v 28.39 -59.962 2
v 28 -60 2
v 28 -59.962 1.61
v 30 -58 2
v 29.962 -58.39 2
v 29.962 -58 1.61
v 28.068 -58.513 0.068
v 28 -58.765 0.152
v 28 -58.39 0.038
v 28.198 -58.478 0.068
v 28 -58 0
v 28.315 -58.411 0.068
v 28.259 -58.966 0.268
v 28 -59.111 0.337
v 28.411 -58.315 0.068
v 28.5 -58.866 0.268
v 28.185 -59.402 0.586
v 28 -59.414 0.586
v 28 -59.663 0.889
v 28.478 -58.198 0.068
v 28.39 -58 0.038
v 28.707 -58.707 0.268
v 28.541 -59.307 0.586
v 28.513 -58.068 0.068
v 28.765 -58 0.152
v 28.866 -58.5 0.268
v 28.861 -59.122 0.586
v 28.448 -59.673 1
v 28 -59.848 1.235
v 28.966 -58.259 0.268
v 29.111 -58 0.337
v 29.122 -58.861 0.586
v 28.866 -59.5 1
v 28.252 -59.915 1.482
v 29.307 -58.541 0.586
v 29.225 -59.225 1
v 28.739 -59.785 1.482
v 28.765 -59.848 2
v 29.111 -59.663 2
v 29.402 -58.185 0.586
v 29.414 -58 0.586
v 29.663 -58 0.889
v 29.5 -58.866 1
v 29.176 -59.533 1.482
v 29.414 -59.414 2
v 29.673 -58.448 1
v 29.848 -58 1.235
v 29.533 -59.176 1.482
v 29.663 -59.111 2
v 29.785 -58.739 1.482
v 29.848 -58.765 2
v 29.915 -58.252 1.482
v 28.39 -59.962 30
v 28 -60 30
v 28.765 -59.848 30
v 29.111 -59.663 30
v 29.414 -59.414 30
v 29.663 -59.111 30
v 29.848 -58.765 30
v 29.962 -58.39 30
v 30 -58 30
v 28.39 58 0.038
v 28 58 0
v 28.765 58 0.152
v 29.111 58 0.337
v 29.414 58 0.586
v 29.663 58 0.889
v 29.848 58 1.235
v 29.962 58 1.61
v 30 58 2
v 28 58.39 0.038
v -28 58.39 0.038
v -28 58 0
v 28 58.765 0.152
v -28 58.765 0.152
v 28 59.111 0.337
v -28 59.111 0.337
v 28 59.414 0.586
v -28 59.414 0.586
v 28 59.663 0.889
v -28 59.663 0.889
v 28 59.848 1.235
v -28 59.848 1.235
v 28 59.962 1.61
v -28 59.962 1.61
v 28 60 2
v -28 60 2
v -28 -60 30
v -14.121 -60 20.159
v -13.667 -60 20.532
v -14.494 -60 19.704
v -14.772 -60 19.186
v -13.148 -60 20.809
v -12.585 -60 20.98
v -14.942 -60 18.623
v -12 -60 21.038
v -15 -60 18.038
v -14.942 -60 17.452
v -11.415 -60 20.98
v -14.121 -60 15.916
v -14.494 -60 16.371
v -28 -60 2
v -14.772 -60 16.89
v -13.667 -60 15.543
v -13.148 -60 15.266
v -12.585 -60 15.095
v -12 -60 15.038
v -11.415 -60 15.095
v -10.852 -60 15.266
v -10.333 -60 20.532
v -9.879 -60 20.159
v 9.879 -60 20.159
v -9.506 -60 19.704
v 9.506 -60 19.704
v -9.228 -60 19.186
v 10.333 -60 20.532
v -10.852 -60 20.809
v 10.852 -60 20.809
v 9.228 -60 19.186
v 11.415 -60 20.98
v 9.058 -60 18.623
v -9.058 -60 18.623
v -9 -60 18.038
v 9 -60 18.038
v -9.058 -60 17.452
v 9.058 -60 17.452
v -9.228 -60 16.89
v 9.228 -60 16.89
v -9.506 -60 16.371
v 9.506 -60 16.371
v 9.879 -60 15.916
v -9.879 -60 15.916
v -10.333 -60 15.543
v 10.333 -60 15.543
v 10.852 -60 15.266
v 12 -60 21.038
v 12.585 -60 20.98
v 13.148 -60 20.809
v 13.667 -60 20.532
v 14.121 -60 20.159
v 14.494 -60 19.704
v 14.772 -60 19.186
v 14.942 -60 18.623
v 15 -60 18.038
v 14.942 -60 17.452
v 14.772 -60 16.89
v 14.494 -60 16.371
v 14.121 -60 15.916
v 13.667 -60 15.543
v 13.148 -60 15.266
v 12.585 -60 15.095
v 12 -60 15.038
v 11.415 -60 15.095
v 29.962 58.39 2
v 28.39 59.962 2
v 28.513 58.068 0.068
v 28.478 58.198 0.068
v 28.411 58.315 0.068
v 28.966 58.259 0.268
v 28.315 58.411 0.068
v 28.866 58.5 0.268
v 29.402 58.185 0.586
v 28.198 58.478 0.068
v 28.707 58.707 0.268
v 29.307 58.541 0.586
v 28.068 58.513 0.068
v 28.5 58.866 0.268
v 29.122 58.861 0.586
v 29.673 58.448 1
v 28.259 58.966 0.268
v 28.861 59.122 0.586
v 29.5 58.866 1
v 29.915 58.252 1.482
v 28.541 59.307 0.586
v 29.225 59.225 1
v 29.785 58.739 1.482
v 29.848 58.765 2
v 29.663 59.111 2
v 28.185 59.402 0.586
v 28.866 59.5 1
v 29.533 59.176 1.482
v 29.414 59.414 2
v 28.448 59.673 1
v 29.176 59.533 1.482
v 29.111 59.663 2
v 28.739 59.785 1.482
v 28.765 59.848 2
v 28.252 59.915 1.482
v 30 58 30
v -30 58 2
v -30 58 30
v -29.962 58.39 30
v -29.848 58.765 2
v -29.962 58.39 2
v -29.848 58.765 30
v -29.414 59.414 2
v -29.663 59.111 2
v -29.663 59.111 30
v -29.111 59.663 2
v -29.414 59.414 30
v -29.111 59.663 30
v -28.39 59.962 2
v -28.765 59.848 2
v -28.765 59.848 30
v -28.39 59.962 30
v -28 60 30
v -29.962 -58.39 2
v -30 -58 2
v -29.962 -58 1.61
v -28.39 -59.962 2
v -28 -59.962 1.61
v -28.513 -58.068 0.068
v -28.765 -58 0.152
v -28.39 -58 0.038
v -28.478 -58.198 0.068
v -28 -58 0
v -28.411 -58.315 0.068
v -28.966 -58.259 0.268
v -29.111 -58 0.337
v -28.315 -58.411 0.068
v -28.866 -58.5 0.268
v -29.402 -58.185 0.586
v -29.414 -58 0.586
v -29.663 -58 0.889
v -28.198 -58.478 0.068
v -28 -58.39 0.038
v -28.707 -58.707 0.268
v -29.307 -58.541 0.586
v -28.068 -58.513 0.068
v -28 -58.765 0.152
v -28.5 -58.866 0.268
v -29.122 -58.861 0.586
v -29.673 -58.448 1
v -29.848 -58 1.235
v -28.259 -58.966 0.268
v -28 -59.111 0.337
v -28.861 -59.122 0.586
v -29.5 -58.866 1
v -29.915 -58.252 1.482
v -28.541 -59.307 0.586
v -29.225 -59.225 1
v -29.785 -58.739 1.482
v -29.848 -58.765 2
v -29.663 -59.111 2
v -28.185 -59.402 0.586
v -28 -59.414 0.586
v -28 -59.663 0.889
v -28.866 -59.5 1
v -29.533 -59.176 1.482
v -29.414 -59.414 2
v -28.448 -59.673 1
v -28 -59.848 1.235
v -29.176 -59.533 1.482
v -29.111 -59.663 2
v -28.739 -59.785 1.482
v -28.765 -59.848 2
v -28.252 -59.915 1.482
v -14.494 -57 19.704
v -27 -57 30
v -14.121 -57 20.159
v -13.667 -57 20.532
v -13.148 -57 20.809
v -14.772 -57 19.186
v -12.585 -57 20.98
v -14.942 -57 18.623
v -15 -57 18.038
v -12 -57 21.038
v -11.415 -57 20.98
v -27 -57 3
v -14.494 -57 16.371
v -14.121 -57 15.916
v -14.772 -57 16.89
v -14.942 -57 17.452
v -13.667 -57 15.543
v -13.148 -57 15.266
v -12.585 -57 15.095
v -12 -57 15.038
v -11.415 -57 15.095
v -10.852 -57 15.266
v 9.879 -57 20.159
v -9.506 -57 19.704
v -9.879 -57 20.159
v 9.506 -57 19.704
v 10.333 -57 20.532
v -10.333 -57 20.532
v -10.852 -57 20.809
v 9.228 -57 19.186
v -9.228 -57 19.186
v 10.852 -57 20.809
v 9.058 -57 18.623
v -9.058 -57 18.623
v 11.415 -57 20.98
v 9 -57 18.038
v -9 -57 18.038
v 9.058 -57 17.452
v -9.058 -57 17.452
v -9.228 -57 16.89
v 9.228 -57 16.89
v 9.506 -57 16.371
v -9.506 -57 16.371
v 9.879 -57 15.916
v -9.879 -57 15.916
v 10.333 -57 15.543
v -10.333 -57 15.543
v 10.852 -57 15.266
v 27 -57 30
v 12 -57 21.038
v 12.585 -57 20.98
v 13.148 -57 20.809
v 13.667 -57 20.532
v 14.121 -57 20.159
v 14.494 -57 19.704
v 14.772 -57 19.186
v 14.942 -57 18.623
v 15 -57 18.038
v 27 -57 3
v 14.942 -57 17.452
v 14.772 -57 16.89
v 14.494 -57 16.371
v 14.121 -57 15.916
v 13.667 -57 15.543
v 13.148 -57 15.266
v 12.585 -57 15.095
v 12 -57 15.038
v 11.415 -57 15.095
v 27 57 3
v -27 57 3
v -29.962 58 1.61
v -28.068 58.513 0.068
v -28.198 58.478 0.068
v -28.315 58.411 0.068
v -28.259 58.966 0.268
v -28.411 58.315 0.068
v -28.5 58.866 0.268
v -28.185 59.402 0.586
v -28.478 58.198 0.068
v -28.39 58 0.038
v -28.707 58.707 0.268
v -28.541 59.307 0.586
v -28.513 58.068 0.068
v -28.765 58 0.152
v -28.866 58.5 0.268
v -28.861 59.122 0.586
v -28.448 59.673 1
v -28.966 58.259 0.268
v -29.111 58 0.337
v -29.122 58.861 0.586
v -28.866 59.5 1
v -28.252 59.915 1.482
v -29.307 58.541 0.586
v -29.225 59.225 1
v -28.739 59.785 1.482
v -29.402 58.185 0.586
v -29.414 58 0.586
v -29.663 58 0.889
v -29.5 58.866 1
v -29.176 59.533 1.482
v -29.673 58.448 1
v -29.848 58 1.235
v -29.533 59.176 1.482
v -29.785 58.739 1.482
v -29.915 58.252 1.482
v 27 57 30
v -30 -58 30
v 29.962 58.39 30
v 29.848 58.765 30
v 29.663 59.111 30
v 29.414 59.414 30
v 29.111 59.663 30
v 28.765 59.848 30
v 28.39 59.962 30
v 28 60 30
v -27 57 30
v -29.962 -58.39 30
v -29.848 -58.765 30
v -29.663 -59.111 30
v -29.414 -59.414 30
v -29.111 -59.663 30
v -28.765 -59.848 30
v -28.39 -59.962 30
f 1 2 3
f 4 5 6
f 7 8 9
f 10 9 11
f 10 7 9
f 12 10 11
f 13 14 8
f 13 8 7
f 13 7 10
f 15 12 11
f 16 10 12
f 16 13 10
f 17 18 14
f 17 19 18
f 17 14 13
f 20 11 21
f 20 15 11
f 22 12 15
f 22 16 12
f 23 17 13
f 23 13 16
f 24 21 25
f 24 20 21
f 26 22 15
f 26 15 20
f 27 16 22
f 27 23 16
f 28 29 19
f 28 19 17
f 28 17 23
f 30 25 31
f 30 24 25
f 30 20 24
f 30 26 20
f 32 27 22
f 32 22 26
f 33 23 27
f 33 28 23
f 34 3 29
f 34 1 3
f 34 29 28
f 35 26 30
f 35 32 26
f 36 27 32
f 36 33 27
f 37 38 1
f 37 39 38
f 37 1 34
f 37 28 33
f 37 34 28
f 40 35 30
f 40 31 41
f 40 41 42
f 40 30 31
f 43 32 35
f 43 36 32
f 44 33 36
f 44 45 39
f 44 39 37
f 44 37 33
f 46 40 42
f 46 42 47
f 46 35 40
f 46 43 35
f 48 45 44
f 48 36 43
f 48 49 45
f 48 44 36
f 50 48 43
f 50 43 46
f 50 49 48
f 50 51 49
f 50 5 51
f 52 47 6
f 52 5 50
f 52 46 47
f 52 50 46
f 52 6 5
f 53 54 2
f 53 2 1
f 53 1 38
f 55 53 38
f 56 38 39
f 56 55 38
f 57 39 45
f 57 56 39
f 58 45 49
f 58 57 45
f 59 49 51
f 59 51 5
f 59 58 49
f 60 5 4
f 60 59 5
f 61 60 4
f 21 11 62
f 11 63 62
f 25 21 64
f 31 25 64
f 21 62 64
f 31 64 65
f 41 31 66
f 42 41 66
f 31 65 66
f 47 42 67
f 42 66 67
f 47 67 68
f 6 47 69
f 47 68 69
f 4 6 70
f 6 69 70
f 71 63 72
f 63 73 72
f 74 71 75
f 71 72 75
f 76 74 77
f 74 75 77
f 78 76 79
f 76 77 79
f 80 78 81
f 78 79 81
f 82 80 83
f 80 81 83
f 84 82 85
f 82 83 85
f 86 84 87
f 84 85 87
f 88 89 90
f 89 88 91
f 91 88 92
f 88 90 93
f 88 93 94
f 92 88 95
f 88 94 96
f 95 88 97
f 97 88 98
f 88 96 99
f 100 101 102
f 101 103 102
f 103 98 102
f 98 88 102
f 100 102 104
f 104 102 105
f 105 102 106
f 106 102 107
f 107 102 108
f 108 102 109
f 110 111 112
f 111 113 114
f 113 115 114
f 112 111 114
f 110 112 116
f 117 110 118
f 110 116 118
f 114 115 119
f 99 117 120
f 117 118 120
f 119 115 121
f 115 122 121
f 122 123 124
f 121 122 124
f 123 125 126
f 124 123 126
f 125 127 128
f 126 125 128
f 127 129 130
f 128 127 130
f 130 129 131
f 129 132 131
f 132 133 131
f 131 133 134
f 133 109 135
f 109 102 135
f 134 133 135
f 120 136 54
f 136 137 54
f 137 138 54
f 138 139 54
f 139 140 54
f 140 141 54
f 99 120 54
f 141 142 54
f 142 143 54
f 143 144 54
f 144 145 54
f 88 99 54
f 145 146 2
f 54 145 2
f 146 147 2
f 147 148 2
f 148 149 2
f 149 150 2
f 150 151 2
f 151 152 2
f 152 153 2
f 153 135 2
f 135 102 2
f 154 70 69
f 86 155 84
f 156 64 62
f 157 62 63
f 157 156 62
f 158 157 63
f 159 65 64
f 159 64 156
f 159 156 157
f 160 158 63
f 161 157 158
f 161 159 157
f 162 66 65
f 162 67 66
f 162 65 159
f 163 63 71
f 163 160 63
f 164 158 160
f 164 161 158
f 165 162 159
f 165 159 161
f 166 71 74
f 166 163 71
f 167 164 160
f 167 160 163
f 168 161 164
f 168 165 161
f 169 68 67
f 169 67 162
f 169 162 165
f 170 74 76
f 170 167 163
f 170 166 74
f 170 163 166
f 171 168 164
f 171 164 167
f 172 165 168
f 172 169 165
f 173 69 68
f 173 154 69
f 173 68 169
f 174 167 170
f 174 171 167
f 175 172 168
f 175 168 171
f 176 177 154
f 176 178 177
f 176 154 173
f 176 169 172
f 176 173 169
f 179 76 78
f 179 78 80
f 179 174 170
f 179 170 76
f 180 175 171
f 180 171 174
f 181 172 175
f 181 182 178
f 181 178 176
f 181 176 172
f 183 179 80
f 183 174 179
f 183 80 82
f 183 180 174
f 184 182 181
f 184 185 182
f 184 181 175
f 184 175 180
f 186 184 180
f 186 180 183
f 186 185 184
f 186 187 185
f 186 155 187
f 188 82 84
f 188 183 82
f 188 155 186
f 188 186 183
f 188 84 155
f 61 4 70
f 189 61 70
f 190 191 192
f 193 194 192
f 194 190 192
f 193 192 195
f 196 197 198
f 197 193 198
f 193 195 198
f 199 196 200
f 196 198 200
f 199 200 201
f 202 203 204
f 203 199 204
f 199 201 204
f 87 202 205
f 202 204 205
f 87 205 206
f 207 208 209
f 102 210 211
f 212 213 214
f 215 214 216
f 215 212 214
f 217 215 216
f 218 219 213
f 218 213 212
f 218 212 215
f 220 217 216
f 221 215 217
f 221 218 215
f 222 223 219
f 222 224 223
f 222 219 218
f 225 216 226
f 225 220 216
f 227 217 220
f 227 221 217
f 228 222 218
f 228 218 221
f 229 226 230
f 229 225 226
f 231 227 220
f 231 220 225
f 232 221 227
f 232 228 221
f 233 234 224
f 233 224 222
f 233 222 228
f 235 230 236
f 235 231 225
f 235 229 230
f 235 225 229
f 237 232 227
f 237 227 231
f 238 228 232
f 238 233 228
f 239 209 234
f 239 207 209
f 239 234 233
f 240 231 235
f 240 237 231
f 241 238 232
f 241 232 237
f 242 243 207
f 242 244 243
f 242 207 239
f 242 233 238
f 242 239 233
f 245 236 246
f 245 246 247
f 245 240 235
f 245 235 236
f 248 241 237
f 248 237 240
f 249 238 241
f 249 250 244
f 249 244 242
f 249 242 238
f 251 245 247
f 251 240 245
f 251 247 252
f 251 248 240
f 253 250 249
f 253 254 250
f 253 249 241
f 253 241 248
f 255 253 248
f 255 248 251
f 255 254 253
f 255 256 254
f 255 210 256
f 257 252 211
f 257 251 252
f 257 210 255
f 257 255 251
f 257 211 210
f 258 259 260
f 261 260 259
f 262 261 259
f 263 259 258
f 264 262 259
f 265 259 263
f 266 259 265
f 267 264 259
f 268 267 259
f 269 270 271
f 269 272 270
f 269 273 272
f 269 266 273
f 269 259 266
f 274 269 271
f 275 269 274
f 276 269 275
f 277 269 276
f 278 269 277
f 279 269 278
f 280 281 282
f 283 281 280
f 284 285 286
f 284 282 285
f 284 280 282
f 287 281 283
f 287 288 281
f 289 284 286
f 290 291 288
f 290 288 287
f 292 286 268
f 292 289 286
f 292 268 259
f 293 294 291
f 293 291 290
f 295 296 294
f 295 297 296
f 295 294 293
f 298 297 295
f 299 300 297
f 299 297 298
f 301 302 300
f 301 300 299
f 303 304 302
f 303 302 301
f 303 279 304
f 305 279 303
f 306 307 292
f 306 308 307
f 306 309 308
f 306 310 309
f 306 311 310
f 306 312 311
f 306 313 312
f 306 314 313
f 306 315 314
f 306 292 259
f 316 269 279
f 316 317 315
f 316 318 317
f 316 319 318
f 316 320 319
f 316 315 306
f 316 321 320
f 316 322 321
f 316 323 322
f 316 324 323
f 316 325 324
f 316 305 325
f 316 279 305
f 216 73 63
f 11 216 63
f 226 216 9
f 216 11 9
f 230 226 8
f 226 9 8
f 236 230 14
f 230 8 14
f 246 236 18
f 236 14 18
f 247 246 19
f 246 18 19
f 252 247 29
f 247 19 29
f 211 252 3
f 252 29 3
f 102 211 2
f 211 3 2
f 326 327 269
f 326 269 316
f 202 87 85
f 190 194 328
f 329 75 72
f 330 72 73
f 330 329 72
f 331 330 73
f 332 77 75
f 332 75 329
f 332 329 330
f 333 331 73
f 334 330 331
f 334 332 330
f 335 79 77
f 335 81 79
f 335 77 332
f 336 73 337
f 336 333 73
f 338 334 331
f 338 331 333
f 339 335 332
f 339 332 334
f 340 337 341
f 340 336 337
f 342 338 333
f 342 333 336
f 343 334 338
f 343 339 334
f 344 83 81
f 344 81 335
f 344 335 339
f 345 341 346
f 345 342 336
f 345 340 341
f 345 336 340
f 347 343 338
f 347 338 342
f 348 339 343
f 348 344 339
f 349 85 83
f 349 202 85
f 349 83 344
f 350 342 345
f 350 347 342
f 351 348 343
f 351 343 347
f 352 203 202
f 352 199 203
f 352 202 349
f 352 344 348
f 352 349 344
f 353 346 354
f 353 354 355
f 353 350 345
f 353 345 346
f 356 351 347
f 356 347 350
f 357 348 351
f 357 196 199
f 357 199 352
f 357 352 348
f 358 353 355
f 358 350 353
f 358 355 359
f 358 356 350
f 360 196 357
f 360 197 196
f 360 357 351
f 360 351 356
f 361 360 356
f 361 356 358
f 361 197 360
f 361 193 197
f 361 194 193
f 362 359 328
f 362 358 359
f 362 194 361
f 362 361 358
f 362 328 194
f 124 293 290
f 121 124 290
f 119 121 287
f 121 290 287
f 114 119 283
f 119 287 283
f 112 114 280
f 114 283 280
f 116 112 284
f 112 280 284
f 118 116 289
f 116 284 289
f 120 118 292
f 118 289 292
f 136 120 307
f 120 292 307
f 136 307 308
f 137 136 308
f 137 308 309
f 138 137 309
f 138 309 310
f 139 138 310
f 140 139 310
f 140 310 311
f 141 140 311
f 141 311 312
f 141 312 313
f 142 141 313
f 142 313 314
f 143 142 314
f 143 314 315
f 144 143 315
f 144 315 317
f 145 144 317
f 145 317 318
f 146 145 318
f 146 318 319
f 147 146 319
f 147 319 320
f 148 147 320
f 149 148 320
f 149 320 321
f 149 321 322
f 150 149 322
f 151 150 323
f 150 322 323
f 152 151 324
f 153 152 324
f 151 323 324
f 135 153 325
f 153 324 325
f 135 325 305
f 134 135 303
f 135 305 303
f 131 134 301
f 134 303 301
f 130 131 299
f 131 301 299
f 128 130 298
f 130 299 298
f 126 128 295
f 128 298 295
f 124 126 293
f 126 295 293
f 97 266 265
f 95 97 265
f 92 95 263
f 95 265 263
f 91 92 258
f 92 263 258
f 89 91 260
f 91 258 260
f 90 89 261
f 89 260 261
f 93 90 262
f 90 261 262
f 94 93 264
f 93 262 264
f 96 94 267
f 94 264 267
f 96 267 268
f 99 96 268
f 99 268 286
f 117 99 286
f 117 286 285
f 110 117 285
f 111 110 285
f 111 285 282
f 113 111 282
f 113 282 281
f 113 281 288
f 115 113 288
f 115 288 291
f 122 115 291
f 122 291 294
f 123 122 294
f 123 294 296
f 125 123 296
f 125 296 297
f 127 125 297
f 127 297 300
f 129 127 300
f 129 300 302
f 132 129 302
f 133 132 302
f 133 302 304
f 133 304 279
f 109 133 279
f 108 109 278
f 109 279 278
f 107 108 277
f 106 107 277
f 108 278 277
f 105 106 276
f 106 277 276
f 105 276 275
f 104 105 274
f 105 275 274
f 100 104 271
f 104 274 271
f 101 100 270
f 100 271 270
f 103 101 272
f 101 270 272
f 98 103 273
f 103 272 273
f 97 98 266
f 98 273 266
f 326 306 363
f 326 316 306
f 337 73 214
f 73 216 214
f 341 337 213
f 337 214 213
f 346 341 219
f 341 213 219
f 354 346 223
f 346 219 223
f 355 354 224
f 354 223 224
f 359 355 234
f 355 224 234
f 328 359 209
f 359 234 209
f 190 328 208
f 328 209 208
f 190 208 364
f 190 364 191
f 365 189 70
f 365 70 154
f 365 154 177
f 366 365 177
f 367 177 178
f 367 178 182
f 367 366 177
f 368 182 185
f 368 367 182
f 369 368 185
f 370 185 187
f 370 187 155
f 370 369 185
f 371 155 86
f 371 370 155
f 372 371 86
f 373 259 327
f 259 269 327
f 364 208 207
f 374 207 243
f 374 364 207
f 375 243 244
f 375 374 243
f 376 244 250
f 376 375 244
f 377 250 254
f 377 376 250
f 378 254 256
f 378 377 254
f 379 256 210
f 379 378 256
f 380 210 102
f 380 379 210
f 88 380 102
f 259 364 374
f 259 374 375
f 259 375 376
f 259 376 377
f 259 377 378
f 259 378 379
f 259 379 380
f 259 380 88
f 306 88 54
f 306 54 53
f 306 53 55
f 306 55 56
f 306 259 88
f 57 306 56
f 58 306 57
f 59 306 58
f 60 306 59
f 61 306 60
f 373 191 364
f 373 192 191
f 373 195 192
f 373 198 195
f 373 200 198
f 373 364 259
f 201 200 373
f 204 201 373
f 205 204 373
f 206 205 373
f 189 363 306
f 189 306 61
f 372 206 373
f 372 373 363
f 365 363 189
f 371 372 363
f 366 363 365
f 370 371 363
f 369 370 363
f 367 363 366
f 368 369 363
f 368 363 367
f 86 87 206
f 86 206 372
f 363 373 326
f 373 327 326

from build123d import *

# Parameters (mm, degrees)
F0_W     = 60
F0_H     = 120
F1_DEPTH = 30
F2_T     = -3
F3_R     = 2
F5_D     = 6
F5_DEPTH = 12
F6_R     = 2


with BuildPart() as f1:
    # F0 (on Top) → F1 (new body)
    with BuildSketch(Plane.XY):
        Rectangle(F0_W, F0_H)
    extrude(amount=F1_DEPTH)

    # F2
    f2_openings = [f1.faces().sort_by_distance(p)[0] for p in [
        (0, 0, 30),
    ]]
    offset(amount=F2_T, openings=f2_openings)

    # F3
    f3_edges = [f1.edges().sort_by_distance(p)[0] for p in [
        (30, -60, 15),
        (30, 60, 15),
        (-30, 60, 15),
        (-30, -60, 15),
    ]]
    fillet(f3_edges, radius=F3_R)

    # F5
    with Locations(Plane.XZ.offset(60)):
        with Locations((-12, 18.03771), (12, 18.03771)):
            Hole(F5_D / 2, depth=F5_DEPTH)

    # F6
    f6_edges = [f1.edges().sort_by_distance(p)[0] for p in [
        (30, 0, 0),
        (29.414214, -59.414214, 0),
        (29.414214, 59.414214, 0),
        (0, -60, 0),
        (0, 60, 0),
        (-29.414214, -59.414214, 0),
        (-29.414214, 59.414214, 0),
        (-30, 0, 0),
    ]]
    fillet(f6_edges, radius=F6_R)


solid = f1.part
